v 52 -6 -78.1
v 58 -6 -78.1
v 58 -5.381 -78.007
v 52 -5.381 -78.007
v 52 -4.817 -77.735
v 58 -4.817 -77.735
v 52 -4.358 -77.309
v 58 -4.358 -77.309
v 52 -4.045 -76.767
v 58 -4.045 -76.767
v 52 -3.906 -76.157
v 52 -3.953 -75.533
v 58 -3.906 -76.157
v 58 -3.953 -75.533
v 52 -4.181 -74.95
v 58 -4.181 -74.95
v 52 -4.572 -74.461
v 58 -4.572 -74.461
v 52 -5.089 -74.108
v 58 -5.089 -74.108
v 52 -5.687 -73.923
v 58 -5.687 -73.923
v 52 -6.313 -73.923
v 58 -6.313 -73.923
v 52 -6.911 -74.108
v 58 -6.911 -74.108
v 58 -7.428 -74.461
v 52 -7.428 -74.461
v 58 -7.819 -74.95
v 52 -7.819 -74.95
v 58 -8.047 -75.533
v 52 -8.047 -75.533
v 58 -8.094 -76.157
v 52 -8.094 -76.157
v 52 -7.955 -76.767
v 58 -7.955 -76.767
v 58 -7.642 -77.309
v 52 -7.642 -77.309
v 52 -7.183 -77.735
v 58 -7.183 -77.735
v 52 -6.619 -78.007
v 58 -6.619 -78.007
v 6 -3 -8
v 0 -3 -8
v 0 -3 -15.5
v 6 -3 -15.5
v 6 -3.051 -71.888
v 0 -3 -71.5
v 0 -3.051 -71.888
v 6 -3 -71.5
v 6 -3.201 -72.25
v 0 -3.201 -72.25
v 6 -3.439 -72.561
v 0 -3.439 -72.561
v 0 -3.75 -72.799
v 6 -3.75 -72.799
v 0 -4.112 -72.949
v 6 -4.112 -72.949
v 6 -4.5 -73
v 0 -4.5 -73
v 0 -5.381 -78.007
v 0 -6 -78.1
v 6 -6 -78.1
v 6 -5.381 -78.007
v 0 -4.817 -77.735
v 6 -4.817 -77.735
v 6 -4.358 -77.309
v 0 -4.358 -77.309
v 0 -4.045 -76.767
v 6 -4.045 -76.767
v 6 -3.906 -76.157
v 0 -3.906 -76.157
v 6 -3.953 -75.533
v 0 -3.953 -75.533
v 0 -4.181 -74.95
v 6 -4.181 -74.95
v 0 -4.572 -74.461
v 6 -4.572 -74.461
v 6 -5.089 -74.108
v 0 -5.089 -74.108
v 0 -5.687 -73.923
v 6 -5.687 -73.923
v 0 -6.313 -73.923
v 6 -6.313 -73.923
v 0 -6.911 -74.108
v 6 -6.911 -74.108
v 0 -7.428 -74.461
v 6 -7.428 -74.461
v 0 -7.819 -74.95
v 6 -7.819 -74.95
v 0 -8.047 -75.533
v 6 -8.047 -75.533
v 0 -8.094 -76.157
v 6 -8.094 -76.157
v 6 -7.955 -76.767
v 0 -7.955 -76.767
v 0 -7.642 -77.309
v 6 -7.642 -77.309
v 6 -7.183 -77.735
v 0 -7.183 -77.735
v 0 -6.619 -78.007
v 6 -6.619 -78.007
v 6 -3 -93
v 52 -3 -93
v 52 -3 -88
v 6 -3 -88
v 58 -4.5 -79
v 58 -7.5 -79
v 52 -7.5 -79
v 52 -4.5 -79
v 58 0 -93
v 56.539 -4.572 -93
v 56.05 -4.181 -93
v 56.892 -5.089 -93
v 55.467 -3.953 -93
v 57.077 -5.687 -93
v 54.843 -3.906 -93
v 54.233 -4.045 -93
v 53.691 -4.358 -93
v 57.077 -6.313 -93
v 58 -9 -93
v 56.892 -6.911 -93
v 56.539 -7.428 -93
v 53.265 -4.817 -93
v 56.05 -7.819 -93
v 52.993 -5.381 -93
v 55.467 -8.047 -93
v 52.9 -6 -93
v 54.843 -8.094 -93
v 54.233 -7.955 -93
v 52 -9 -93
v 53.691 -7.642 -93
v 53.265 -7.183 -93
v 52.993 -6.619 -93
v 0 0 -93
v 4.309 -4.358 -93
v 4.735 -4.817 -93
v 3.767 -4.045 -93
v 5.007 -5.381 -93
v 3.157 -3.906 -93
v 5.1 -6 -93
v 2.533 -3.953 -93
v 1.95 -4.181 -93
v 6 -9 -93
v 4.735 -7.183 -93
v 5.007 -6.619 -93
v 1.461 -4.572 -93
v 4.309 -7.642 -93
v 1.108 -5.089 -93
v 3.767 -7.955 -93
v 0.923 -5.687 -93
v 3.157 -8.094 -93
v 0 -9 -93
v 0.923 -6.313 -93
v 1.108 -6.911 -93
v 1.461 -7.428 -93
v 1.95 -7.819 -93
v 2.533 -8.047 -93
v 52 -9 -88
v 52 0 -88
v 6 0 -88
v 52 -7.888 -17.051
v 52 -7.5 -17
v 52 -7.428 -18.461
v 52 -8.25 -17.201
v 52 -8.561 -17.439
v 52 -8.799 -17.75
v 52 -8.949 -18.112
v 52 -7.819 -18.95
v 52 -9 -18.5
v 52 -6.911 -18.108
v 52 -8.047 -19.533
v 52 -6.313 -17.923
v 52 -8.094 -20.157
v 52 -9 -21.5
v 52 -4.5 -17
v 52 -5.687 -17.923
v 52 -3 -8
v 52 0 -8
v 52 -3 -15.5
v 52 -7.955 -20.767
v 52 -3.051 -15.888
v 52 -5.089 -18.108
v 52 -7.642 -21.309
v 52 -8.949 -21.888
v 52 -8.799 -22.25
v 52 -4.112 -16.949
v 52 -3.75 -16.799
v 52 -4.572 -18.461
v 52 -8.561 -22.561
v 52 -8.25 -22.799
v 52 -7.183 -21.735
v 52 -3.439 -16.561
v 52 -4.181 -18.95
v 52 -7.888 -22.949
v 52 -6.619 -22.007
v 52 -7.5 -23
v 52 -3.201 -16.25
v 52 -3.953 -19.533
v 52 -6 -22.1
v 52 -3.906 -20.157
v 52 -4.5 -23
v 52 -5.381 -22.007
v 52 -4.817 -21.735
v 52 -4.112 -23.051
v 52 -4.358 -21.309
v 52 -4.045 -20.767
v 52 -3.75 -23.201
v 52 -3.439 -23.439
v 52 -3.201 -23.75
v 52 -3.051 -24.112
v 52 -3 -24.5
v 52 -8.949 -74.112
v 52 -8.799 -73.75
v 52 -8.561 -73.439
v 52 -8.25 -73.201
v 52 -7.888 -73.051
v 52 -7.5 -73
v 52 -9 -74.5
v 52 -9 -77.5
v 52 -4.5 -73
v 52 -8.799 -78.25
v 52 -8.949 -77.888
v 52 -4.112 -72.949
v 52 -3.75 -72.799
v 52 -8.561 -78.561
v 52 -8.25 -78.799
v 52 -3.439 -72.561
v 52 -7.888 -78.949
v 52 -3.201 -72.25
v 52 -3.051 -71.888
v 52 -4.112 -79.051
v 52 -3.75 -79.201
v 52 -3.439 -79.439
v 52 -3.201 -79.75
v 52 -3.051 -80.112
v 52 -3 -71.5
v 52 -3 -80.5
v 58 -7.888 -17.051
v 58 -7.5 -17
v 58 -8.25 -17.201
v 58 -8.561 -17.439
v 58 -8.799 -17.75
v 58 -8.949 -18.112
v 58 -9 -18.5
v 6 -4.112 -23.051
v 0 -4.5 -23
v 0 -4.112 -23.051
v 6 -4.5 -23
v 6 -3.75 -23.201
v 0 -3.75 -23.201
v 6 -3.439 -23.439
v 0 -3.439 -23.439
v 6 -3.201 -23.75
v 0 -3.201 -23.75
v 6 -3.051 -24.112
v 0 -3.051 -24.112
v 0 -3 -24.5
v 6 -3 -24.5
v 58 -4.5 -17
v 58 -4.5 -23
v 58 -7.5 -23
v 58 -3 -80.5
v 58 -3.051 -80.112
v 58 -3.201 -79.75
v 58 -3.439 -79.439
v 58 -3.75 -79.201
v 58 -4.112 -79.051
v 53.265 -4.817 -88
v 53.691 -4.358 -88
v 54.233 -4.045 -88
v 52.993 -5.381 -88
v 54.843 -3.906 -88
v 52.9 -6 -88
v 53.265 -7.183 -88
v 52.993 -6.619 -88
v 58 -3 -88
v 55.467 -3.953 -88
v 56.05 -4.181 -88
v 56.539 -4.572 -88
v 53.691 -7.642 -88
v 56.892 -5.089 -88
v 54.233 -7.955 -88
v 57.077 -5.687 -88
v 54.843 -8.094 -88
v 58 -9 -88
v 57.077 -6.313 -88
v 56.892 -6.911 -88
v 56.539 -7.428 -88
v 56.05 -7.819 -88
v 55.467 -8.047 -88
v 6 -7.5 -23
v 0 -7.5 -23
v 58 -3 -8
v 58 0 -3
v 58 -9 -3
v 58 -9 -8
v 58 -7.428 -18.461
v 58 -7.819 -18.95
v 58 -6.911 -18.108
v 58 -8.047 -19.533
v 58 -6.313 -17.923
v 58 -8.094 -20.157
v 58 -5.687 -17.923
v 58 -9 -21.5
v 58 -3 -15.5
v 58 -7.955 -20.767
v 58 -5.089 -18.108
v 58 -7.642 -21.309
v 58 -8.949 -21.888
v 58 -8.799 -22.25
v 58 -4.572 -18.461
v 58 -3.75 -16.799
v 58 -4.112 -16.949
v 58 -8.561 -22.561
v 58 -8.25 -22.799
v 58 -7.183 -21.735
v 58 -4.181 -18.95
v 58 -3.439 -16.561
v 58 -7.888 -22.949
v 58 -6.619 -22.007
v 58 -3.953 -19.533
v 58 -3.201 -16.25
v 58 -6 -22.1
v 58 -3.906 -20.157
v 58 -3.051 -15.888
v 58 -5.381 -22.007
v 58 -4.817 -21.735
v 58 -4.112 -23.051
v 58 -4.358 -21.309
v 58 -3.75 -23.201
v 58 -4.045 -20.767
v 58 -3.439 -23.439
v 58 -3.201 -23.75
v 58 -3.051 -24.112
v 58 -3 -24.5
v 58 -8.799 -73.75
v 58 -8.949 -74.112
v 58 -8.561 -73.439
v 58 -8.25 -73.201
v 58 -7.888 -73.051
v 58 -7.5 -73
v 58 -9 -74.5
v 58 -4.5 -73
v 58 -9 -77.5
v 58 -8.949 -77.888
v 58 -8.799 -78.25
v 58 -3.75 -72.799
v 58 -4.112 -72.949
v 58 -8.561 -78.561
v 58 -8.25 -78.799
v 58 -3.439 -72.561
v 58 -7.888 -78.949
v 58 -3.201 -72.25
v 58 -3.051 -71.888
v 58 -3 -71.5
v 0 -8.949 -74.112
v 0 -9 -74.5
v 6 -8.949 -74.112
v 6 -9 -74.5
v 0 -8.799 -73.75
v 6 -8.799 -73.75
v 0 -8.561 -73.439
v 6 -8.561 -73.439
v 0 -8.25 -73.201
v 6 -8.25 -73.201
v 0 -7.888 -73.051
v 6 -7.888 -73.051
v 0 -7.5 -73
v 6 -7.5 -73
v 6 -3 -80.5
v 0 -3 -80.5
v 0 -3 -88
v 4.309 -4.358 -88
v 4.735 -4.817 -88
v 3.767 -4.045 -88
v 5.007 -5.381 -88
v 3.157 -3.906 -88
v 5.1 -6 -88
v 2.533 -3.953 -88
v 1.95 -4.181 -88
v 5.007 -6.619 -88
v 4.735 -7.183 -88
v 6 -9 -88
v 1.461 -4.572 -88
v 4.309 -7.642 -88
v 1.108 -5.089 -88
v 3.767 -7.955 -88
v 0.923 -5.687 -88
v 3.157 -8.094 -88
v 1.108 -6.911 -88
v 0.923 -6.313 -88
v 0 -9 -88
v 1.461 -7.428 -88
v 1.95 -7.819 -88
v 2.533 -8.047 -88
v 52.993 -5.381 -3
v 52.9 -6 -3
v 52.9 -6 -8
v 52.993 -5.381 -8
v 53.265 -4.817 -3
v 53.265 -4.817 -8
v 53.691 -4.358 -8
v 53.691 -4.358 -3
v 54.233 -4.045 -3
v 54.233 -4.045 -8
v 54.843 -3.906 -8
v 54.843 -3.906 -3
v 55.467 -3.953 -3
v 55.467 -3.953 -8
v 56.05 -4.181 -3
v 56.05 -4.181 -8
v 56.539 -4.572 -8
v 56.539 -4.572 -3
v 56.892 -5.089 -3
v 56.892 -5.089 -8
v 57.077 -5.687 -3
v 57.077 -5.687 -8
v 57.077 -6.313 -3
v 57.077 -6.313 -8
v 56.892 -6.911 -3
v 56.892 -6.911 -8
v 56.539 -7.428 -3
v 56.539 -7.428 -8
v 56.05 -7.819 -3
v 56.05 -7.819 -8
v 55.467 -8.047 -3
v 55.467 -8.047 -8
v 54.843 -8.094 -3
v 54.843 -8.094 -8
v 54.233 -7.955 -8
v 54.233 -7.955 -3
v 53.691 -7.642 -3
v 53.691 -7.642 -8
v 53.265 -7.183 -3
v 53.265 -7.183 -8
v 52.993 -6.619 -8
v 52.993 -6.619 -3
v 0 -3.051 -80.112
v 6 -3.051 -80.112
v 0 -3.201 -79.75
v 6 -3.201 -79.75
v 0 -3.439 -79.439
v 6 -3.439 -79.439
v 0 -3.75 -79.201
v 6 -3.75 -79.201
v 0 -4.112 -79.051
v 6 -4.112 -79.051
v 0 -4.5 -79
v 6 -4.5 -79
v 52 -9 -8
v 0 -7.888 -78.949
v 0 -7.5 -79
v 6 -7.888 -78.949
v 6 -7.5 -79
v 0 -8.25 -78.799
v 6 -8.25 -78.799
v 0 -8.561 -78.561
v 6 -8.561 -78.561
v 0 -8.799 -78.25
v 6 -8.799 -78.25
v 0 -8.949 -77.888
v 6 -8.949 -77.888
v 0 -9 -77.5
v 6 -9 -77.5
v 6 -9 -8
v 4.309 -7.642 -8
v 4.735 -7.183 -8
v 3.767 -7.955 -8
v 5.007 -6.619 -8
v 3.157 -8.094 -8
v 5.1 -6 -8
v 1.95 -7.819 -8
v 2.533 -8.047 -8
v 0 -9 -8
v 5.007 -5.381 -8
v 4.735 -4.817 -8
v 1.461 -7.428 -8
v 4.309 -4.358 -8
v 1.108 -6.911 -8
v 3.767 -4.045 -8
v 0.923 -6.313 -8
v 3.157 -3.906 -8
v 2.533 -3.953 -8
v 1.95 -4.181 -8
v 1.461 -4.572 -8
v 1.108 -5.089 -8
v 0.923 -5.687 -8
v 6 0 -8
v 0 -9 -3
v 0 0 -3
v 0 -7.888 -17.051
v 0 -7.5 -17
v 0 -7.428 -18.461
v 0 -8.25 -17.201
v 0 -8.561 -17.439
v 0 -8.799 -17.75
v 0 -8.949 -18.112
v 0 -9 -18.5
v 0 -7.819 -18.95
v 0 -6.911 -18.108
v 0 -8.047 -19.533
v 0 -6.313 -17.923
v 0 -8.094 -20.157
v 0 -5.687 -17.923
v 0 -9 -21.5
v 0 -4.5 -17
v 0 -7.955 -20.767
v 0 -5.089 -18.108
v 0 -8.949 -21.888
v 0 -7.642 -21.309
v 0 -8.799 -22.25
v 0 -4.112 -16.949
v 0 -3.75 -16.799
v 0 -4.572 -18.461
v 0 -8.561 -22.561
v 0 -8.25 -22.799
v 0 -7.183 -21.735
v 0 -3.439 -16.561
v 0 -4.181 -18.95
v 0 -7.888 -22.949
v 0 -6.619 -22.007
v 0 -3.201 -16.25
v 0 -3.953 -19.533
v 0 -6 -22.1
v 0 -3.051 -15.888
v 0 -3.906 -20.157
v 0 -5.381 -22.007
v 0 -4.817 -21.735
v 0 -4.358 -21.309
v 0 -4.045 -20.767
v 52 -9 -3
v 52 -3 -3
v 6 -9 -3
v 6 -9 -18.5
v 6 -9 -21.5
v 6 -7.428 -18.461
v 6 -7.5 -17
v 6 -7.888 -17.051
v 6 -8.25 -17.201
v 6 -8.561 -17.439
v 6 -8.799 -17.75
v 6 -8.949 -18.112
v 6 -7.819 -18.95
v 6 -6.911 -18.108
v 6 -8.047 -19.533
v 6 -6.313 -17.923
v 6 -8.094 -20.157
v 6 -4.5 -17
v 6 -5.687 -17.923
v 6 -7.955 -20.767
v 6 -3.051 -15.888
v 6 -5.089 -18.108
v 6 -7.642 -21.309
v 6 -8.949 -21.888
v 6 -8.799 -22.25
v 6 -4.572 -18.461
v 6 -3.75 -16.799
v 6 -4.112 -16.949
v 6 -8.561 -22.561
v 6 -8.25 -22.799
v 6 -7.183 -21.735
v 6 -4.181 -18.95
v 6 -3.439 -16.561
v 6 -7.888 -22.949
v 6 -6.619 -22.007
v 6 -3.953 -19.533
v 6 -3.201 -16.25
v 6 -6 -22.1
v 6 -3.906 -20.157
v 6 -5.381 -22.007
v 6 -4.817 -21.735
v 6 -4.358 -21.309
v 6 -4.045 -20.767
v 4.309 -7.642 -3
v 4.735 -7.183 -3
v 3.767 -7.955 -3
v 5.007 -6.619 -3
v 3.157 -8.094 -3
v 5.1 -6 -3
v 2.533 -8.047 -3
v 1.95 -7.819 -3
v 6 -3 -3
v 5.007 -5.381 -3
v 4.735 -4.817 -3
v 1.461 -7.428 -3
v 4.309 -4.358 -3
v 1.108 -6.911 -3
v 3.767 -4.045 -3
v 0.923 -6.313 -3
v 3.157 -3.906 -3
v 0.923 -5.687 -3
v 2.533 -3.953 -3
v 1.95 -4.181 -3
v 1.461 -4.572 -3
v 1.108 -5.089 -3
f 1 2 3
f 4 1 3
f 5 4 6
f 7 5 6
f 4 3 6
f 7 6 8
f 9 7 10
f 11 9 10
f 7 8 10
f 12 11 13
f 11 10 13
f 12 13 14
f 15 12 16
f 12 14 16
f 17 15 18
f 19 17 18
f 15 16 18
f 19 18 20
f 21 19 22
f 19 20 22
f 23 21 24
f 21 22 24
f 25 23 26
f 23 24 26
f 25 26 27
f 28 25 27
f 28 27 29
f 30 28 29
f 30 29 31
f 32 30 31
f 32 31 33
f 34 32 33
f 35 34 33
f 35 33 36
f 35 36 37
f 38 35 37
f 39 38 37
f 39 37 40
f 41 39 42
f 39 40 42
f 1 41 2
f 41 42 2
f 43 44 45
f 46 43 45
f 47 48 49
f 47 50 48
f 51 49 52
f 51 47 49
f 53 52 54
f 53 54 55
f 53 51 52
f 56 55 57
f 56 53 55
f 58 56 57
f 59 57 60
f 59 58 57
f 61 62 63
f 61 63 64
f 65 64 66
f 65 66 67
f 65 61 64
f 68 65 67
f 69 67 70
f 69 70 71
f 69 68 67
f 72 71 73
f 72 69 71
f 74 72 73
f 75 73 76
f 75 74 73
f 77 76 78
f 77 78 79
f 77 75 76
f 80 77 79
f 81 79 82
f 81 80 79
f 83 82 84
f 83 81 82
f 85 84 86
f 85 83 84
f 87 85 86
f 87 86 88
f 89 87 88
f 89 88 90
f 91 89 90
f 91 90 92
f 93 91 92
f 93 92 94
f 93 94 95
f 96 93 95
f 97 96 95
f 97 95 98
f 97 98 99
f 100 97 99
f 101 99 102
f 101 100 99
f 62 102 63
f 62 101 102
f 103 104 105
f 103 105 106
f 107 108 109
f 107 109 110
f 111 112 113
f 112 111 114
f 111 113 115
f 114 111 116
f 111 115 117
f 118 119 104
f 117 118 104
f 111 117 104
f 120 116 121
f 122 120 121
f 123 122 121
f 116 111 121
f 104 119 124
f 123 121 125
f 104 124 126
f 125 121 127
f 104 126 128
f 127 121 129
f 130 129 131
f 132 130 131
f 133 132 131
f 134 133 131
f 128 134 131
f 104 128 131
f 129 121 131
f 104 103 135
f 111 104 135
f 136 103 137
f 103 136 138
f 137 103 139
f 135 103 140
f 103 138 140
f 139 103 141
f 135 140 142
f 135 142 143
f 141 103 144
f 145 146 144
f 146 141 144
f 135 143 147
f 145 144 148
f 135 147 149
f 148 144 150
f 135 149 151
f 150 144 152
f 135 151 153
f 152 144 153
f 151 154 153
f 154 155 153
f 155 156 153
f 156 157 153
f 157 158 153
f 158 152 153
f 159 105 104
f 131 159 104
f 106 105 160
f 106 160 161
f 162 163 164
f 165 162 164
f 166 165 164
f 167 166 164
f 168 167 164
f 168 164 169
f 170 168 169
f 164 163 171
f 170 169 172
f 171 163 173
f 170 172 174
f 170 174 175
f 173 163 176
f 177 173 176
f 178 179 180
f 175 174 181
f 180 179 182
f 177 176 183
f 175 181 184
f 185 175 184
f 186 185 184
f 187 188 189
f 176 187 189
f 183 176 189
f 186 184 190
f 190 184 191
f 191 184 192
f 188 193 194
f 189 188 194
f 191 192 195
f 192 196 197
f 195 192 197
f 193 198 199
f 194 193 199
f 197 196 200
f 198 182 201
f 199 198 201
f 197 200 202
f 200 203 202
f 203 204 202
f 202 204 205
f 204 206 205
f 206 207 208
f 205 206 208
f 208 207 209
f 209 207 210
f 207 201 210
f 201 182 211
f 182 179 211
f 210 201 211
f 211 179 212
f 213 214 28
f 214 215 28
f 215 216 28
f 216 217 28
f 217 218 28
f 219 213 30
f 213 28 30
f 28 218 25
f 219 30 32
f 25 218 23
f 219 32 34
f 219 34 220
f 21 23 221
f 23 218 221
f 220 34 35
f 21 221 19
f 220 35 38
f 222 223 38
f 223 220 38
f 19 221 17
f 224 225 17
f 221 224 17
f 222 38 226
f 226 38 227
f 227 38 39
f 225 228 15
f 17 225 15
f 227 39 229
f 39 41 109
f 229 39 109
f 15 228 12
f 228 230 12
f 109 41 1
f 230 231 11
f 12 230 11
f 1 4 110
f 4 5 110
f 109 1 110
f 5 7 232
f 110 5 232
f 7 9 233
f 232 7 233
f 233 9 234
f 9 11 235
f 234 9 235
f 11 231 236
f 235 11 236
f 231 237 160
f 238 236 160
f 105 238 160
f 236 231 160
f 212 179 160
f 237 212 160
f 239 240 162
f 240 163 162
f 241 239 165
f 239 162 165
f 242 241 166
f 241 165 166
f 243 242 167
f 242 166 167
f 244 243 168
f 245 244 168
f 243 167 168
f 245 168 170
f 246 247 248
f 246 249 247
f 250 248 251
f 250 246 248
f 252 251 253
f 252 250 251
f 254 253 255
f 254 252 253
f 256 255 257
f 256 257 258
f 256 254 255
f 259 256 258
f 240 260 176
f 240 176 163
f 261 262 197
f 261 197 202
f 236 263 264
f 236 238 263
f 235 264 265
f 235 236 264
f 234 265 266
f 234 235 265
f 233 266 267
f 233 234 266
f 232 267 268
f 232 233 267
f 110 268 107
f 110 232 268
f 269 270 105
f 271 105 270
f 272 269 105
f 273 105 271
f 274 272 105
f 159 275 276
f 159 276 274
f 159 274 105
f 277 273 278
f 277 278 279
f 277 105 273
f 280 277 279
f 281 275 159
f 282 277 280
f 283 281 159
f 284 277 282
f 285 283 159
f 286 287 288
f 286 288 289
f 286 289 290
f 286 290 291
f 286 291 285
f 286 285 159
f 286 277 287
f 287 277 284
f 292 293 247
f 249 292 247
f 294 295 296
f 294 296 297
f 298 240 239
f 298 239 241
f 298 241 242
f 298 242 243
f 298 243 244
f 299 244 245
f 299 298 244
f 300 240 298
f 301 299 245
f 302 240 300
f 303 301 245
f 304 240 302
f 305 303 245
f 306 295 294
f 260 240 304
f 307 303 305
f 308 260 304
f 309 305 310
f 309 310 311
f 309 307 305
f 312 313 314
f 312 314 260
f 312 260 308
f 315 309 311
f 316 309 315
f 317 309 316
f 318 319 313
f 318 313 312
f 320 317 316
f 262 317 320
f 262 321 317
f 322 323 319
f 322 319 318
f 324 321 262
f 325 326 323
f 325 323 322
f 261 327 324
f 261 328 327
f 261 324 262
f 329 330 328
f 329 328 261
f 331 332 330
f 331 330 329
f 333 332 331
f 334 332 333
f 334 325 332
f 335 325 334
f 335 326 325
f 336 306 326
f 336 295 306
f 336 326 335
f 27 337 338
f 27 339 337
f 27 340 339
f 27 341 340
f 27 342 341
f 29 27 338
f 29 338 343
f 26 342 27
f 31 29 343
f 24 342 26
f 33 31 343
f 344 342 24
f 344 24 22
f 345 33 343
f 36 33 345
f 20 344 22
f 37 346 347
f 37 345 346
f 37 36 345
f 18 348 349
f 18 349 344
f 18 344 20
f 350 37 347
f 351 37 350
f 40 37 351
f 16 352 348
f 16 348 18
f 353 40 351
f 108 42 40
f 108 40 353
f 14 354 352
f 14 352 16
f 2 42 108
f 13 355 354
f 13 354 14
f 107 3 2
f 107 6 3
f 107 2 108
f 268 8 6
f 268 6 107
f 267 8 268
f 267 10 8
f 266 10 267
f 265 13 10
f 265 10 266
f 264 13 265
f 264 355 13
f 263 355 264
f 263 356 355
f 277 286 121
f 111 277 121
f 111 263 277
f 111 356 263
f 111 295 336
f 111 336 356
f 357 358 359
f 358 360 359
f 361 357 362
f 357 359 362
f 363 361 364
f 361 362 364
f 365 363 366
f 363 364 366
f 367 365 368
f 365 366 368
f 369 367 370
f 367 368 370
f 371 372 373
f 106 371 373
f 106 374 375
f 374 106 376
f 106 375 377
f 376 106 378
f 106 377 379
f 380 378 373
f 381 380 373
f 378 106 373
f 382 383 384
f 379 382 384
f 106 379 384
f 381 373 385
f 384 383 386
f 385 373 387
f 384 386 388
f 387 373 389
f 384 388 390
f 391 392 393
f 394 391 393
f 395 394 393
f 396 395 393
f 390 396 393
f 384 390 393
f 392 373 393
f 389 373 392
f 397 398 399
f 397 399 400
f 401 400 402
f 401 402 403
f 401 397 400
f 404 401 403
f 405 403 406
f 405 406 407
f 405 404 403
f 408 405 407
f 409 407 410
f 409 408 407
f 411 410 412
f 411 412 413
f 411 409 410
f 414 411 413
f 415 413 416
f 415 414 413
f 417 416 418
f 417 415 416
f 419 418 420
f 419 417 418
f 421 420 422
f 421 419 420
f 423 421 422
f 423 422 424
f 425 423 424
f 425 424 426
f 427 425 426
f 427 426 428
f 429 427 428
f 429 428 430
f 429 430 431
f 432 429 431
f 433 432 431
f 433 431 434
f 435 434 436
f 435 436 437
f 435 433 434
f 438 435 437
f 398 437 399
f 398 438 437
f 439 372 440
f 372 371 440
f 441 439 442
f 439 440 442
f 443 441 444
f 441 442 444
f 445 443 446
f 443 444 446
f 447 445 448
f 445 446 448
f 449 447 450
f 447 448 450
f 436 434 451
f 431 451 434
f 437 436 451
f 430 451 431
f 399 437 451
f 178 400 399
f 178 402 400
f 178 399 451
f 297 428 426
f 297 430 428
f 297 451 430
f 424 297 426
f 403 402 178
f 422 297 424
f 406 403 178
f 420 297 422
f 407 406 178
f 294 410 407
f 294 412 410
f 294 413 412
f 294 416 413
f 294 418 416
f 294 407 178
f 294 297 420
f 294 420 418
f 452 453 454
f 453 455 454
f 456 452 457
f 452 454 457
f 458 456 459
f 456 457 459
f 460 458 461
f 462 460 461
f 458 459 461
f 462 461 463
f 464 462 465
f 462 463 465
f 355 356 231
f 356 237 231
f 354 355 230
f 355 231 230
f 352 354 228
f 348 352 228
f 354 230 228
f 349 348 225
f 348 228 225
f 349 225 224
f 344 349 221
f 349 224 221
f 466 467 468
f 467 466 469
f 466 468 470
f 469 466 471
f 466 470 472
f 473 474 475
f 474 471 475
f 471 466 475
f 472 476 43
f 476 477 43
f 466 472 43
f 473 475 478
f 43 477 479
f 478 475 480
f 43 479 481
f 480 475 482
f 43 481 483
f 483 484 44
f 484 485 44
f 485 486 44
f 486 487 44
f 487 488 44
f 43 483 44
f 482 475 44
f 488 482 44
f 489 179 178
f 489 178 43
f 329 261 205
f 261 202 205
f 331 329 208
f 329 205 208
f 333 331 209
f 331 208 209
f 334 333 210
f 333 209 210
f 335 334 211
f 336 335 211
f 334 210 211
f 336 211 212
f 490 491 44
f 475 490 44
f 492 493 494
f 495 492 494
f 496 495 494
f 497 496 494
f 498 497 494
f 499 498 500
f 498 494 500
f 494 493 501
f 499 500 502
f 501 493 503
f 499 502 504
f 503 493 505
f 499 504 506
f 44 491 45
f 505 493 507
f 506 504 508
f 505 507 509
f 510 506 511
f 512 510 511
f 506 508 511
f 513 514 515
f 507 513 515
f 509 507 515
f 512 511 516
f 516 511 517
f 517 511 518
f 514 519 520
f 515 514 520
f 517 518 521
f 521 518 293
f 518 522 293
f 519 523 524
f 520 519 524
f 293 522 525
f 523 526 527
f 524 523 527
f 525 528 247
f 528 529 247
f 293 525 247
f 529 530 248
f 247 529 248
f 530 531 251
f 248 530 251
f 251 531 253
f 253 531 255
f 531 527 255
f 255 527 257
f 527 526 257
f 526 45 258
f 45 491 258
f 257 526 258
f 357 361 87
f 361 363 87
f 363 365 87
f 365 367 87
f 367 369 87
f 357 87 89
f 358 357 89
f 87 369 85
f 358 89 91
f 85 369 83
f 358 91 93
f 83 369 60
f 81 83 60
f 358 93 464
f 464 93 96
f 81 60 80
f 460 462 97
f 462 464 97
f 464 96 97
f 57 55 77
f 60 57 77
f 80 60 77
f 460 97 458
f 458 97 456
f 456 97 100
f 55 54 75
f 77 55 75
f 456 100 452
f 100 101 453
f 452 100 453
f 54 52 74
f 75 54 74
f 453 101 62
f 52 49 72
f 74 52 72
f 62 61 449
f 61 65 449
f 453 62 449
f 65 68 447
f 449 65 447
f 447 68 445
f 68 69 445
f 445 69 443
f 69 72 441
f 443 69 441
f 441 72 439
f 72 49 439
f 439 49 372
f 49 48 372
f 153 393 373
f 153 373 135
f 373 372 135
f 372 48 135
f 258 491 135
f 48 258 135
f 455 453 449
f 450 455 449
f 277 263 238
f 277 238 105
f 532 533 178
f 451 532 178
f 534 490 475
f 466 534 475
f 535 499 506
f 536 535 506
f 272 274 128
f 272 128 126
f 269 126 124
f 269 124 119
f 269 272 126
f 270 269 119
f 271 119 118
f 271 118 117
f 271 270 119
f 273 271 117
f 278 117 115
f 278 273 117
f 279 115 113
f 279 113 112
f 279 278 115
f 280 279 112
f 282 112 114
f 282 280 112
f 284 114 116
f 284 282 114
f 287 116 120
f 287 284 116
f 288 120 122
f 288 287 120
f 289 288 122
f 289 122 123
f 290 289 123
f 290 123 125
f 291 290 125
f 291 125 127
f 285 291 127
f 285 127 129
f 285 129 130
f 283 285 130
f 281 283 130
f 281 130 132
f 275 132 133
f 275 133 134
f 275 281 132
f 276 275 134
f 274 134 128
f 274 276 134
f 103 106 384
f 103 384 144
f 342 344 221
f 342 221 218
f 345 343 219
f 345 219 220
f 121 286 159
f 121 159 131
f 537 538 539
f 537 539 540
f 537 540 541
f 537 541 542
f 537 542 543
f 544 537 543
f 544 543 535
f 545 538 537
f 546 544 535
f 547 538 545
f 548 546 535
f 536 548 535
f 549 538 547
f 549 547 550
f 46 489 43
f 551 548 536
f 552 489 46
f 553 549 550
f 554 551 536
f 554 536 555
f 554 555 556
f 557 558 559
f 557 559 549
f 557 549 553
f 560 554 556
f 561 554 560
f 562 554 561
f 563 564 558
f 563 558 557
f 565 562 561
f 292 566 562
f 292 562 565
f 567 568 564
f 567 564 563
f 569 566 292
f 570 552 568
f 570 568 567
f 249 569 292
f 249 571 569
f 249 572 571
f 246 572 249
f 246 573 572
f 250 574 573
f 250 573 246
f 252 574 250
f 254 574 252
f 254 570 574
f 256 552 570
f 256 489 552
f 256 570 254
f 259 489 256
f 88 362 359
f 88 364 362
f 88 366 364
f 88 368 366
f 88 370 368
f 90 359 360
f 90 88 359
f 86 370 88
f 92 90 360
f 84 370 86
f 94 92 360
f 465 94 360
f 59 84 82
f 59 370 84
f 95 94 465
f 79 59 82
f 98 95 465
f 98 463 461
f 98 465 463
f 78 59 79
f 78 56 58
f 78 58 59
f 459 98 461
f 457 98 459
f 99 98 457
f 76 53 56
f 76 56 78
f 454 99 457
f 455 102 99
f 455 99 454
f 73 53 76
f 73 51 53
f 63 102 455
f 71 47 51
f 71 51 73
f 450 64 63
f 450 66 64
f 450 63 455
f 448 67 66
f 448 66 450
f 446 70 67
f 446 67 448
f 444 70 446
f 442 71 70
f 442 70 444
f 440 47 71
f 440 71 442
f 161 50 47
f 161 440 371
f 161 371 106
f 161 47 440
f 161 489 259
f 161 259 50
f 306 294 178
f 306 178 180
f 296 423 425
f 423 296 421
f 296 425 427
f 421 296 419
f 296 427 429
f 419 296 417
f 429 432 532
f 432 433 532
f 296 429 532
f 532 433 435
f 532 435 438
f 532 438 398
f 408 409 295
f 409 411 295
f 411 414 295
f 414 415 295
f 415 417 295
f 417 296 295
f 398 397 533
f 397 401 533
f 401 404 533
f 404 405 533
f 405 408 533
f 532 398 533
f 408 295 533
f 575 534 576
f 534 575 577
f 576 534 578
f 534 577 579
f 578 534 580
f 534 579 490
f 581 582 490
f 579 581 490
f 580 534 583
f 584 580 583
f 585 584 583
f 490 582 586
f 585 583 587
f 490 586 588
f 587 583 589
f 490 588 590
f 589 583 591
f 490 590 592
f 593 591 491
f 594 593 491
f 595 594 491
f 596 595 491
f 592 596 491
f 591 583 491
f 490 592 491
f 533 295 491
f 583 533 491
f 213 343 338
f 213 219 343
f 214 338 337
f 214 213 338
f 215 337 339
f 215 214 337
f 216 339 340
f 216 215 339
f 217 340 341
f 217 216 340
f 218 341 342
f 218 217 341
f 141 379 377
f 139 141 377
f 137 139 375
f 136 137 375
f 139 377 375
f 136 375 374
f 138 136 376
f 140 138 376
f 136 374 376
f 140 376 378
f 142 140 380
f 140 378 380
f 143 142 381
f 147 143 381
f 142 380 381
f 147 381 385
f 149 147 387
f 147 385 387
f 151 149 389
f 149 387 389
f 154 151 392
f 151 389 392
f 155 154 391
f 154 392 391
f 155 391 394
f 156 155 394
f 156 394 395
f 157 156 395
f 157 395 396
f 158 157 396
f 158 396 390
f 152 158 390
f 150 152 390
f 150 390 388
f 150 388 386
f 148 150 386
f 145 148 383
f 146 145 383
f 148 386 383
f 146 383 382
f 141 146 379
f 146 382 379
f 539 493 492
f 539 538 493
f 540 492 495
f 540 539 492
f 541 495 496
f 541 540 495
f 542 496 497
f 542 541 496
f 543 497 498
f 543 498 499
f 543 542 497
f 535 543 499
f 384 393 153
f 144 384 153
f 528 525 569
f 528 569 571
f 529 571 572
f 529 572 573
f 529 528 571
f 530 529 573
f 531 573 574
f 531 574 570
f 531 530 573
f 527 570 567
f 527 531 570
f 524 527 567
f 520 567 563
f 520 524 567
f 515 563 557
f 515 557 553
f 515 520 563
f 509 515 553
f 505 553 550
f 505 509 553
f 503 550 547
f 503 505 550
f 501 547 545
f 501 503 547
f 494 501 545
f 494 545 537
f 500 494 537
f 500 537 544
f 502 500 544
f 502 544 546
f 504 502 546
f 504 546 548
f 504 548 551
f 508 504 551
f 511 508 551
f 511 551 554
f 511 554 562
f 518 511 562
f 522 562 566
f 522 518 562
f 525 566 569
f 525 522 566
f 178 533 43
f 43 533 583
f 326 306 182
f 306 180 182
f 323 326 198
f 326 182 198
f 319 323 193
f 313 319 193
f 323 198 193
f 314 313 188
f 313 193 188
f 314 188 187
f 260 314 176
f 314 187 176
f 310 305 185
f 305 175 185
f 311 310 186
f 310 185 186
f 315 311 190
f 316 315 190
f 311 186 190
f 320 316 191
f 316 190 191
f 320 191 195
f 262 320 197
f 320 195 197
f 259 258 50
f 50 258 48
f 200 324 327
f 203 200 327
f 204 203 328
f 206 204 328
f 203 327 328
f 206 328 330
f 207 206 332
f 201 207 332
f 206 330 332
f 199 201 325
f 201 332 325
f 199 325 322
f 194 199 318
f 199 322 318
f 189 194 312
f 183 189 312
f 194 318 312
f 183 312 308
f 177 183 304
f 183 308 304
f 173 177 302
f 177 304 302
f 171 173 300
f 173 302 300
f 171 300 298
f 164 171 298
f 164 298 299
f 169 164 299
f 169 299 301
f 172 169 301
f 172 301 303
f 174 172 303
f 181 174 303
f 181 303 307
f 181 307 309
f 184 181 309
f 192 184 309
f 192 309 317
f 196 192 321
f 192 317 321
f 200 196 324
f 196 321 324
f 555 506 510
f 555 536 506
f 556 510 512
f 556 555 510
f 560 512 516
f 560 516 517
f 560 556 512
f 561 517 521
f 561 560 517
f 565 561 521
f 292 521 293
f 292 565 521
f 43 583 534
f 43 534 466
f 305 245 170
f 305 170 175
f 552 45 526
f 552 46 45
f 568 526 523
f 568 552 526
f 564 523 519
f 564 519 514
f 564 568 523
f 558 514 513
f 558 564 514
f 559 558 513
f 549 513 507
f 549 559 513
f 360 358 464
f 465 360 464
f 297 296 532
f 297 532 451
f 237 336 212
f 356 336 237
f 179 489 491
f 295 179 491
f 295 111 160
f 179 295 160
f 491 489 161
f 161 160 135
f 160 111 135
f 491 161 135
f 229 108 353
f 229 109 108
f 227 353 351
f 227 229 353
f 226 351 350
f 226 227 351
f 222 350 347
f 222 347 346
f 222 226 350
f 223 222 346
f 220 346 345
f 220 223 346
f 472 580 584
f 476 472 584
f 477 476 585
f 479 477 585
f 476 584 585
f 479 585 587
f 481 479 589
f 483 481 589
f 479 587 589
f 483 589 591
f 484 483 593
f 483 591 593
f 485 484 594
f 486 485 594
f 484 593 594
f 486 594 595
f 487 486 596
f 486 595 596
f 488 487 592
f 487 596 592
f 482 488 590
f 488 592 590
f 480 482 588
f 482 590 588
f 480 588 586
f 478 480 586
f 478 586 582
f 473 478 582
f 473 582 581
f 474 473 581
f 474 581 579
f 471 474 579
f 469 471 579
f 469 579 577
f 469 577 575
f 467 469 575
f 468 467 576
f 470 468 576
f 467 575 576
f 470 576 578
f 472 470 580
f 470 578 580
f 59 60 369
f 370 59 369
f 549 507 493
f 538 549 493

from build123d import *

# Parameters (mm, degrees)
SKETCH1_R               = 2.1
BOSS_EXTRUDE1_DEPTH     = 6
FILLET1_R               = 1.5
SKETCH2_R               = 2.1
CUT_EXTRUDE1_DEPTH      = 5
CUT_EXTRUDE2_START      = -85
SKETCH2_2_R             = 2.1
CUT_EXTRUDE2_DEPTH      = 5
SKETCH4_W               = 23
SKETCH4_H               = 3
BOSS_EXTRUDE2_DEPTH     = 5
BOSS_EXTRUDE3_START     = -3
BOSS_EXTRUDE3_OUTLINE_W = 23
BOSS_EXTRUDE3_OUTLINE_H = 5
BOSS_EXTRUDE3_DEPTH     = 3


# Read off the part's stored shape, not the designer's step: Boss-Extrude3
with BuildPart() as part:
    # Sketch1 → Boss-Extrude1 (new body)
    with BuildSketch(Plane(origin=(0, 0, 0), x_dir=(0, 0, -1), z_dir=(1, 0, 0))):
        Polygon((84, 0), (3, 0), (3, -9), (8, -9), (8, -3), (17, -3), (17, -9), (23, -9), (23, -3), (73, -3), (73, -9), (79, -9), (79, -3), (88, -3), (88, -9), (93, -9), (93, 0), align=None)
        with Locations((20, -6)):
            Circle(SKETCH1_R, mode=Mode.SUBTRACT)
        with Locations((76, -6)):
            Circle(SKETCH1_R, mode=Mode.SUBTRACT)
    extrude(amount=BOSS_EXTRUDE1_DEPTH)

    # Fillet1
    fillet1_edges = [part.edges().sort_by_distance(p)[0] for p in [
        (3, -9, -23),
        (3, -9, -17),
        (3, -3, -17),
        (3, -3, -79),
        (3, -9, -79),
        (3, -9, -73),
        (3, -3, -73),
        (3, -3, -23),
    ]]
    fillet(fillet1_edges, radius=FILLET1_R)

    # Sketch2 → Cut-Extrude1 (cut)
    with BuildSketch(Plane.XY.offset(-3)):
        with Locations((3, -6)):
            Circle(SKETCH2_R)
    extrude(amount=-CUT_EXTRUDE1_DEPTH, mode=Mode.SUBTRACT)

    # Sketch2<2> → Cut-Extrude2 (cut)
    with BuildSketch(Plane.XY.offset(-3).offset(CUT_EXTRUDE2_START)):
        with Locations((3, -6)):
            Circle(SKETCH2_2_R)
    extrude(amount=-CUT_EXTRUDE2_DEPTH, mode=Mode.SUBTRACT)

    # Sketch4 → Boss-Extrude2 (add)
    with BuildSketch(Plane.XY.offset(-3)):
        with Locations((17.5, -1.5)):
            Rectangle(SKETCH4_W, SKETCH4_H)
    extrude(amount=-BOSS_EXTRUDE2_DEPTH)

    # Boss-Extrude3 outline → Boss-Extrude3 (add)
    with BuildSketch(Plane(origin=(0, 0, 0), x_dir=(1, 0, 0), z_dir=(0, 1, 0)).offset(BOSS_EXTRUDE3_START)):
        with Locations((17.5, 90.5)):
            Rectangle(BOSS_EXTRUDE3_OUTLINE_W, BOSS_EXTRUDE3_OUTLINE_H)
    extrude(amount=BOSS_EXTRUDE3_DEPTH)

    # Mirror1: part across plane


with BuildPart() as part_1:
    add(part.part)
    add(part.part.mirror(Plane(origin=(29, 0, 0), x_dir=(0, 0, 1), z_dir=(1, 0, 0))))


solid = part_1.part
